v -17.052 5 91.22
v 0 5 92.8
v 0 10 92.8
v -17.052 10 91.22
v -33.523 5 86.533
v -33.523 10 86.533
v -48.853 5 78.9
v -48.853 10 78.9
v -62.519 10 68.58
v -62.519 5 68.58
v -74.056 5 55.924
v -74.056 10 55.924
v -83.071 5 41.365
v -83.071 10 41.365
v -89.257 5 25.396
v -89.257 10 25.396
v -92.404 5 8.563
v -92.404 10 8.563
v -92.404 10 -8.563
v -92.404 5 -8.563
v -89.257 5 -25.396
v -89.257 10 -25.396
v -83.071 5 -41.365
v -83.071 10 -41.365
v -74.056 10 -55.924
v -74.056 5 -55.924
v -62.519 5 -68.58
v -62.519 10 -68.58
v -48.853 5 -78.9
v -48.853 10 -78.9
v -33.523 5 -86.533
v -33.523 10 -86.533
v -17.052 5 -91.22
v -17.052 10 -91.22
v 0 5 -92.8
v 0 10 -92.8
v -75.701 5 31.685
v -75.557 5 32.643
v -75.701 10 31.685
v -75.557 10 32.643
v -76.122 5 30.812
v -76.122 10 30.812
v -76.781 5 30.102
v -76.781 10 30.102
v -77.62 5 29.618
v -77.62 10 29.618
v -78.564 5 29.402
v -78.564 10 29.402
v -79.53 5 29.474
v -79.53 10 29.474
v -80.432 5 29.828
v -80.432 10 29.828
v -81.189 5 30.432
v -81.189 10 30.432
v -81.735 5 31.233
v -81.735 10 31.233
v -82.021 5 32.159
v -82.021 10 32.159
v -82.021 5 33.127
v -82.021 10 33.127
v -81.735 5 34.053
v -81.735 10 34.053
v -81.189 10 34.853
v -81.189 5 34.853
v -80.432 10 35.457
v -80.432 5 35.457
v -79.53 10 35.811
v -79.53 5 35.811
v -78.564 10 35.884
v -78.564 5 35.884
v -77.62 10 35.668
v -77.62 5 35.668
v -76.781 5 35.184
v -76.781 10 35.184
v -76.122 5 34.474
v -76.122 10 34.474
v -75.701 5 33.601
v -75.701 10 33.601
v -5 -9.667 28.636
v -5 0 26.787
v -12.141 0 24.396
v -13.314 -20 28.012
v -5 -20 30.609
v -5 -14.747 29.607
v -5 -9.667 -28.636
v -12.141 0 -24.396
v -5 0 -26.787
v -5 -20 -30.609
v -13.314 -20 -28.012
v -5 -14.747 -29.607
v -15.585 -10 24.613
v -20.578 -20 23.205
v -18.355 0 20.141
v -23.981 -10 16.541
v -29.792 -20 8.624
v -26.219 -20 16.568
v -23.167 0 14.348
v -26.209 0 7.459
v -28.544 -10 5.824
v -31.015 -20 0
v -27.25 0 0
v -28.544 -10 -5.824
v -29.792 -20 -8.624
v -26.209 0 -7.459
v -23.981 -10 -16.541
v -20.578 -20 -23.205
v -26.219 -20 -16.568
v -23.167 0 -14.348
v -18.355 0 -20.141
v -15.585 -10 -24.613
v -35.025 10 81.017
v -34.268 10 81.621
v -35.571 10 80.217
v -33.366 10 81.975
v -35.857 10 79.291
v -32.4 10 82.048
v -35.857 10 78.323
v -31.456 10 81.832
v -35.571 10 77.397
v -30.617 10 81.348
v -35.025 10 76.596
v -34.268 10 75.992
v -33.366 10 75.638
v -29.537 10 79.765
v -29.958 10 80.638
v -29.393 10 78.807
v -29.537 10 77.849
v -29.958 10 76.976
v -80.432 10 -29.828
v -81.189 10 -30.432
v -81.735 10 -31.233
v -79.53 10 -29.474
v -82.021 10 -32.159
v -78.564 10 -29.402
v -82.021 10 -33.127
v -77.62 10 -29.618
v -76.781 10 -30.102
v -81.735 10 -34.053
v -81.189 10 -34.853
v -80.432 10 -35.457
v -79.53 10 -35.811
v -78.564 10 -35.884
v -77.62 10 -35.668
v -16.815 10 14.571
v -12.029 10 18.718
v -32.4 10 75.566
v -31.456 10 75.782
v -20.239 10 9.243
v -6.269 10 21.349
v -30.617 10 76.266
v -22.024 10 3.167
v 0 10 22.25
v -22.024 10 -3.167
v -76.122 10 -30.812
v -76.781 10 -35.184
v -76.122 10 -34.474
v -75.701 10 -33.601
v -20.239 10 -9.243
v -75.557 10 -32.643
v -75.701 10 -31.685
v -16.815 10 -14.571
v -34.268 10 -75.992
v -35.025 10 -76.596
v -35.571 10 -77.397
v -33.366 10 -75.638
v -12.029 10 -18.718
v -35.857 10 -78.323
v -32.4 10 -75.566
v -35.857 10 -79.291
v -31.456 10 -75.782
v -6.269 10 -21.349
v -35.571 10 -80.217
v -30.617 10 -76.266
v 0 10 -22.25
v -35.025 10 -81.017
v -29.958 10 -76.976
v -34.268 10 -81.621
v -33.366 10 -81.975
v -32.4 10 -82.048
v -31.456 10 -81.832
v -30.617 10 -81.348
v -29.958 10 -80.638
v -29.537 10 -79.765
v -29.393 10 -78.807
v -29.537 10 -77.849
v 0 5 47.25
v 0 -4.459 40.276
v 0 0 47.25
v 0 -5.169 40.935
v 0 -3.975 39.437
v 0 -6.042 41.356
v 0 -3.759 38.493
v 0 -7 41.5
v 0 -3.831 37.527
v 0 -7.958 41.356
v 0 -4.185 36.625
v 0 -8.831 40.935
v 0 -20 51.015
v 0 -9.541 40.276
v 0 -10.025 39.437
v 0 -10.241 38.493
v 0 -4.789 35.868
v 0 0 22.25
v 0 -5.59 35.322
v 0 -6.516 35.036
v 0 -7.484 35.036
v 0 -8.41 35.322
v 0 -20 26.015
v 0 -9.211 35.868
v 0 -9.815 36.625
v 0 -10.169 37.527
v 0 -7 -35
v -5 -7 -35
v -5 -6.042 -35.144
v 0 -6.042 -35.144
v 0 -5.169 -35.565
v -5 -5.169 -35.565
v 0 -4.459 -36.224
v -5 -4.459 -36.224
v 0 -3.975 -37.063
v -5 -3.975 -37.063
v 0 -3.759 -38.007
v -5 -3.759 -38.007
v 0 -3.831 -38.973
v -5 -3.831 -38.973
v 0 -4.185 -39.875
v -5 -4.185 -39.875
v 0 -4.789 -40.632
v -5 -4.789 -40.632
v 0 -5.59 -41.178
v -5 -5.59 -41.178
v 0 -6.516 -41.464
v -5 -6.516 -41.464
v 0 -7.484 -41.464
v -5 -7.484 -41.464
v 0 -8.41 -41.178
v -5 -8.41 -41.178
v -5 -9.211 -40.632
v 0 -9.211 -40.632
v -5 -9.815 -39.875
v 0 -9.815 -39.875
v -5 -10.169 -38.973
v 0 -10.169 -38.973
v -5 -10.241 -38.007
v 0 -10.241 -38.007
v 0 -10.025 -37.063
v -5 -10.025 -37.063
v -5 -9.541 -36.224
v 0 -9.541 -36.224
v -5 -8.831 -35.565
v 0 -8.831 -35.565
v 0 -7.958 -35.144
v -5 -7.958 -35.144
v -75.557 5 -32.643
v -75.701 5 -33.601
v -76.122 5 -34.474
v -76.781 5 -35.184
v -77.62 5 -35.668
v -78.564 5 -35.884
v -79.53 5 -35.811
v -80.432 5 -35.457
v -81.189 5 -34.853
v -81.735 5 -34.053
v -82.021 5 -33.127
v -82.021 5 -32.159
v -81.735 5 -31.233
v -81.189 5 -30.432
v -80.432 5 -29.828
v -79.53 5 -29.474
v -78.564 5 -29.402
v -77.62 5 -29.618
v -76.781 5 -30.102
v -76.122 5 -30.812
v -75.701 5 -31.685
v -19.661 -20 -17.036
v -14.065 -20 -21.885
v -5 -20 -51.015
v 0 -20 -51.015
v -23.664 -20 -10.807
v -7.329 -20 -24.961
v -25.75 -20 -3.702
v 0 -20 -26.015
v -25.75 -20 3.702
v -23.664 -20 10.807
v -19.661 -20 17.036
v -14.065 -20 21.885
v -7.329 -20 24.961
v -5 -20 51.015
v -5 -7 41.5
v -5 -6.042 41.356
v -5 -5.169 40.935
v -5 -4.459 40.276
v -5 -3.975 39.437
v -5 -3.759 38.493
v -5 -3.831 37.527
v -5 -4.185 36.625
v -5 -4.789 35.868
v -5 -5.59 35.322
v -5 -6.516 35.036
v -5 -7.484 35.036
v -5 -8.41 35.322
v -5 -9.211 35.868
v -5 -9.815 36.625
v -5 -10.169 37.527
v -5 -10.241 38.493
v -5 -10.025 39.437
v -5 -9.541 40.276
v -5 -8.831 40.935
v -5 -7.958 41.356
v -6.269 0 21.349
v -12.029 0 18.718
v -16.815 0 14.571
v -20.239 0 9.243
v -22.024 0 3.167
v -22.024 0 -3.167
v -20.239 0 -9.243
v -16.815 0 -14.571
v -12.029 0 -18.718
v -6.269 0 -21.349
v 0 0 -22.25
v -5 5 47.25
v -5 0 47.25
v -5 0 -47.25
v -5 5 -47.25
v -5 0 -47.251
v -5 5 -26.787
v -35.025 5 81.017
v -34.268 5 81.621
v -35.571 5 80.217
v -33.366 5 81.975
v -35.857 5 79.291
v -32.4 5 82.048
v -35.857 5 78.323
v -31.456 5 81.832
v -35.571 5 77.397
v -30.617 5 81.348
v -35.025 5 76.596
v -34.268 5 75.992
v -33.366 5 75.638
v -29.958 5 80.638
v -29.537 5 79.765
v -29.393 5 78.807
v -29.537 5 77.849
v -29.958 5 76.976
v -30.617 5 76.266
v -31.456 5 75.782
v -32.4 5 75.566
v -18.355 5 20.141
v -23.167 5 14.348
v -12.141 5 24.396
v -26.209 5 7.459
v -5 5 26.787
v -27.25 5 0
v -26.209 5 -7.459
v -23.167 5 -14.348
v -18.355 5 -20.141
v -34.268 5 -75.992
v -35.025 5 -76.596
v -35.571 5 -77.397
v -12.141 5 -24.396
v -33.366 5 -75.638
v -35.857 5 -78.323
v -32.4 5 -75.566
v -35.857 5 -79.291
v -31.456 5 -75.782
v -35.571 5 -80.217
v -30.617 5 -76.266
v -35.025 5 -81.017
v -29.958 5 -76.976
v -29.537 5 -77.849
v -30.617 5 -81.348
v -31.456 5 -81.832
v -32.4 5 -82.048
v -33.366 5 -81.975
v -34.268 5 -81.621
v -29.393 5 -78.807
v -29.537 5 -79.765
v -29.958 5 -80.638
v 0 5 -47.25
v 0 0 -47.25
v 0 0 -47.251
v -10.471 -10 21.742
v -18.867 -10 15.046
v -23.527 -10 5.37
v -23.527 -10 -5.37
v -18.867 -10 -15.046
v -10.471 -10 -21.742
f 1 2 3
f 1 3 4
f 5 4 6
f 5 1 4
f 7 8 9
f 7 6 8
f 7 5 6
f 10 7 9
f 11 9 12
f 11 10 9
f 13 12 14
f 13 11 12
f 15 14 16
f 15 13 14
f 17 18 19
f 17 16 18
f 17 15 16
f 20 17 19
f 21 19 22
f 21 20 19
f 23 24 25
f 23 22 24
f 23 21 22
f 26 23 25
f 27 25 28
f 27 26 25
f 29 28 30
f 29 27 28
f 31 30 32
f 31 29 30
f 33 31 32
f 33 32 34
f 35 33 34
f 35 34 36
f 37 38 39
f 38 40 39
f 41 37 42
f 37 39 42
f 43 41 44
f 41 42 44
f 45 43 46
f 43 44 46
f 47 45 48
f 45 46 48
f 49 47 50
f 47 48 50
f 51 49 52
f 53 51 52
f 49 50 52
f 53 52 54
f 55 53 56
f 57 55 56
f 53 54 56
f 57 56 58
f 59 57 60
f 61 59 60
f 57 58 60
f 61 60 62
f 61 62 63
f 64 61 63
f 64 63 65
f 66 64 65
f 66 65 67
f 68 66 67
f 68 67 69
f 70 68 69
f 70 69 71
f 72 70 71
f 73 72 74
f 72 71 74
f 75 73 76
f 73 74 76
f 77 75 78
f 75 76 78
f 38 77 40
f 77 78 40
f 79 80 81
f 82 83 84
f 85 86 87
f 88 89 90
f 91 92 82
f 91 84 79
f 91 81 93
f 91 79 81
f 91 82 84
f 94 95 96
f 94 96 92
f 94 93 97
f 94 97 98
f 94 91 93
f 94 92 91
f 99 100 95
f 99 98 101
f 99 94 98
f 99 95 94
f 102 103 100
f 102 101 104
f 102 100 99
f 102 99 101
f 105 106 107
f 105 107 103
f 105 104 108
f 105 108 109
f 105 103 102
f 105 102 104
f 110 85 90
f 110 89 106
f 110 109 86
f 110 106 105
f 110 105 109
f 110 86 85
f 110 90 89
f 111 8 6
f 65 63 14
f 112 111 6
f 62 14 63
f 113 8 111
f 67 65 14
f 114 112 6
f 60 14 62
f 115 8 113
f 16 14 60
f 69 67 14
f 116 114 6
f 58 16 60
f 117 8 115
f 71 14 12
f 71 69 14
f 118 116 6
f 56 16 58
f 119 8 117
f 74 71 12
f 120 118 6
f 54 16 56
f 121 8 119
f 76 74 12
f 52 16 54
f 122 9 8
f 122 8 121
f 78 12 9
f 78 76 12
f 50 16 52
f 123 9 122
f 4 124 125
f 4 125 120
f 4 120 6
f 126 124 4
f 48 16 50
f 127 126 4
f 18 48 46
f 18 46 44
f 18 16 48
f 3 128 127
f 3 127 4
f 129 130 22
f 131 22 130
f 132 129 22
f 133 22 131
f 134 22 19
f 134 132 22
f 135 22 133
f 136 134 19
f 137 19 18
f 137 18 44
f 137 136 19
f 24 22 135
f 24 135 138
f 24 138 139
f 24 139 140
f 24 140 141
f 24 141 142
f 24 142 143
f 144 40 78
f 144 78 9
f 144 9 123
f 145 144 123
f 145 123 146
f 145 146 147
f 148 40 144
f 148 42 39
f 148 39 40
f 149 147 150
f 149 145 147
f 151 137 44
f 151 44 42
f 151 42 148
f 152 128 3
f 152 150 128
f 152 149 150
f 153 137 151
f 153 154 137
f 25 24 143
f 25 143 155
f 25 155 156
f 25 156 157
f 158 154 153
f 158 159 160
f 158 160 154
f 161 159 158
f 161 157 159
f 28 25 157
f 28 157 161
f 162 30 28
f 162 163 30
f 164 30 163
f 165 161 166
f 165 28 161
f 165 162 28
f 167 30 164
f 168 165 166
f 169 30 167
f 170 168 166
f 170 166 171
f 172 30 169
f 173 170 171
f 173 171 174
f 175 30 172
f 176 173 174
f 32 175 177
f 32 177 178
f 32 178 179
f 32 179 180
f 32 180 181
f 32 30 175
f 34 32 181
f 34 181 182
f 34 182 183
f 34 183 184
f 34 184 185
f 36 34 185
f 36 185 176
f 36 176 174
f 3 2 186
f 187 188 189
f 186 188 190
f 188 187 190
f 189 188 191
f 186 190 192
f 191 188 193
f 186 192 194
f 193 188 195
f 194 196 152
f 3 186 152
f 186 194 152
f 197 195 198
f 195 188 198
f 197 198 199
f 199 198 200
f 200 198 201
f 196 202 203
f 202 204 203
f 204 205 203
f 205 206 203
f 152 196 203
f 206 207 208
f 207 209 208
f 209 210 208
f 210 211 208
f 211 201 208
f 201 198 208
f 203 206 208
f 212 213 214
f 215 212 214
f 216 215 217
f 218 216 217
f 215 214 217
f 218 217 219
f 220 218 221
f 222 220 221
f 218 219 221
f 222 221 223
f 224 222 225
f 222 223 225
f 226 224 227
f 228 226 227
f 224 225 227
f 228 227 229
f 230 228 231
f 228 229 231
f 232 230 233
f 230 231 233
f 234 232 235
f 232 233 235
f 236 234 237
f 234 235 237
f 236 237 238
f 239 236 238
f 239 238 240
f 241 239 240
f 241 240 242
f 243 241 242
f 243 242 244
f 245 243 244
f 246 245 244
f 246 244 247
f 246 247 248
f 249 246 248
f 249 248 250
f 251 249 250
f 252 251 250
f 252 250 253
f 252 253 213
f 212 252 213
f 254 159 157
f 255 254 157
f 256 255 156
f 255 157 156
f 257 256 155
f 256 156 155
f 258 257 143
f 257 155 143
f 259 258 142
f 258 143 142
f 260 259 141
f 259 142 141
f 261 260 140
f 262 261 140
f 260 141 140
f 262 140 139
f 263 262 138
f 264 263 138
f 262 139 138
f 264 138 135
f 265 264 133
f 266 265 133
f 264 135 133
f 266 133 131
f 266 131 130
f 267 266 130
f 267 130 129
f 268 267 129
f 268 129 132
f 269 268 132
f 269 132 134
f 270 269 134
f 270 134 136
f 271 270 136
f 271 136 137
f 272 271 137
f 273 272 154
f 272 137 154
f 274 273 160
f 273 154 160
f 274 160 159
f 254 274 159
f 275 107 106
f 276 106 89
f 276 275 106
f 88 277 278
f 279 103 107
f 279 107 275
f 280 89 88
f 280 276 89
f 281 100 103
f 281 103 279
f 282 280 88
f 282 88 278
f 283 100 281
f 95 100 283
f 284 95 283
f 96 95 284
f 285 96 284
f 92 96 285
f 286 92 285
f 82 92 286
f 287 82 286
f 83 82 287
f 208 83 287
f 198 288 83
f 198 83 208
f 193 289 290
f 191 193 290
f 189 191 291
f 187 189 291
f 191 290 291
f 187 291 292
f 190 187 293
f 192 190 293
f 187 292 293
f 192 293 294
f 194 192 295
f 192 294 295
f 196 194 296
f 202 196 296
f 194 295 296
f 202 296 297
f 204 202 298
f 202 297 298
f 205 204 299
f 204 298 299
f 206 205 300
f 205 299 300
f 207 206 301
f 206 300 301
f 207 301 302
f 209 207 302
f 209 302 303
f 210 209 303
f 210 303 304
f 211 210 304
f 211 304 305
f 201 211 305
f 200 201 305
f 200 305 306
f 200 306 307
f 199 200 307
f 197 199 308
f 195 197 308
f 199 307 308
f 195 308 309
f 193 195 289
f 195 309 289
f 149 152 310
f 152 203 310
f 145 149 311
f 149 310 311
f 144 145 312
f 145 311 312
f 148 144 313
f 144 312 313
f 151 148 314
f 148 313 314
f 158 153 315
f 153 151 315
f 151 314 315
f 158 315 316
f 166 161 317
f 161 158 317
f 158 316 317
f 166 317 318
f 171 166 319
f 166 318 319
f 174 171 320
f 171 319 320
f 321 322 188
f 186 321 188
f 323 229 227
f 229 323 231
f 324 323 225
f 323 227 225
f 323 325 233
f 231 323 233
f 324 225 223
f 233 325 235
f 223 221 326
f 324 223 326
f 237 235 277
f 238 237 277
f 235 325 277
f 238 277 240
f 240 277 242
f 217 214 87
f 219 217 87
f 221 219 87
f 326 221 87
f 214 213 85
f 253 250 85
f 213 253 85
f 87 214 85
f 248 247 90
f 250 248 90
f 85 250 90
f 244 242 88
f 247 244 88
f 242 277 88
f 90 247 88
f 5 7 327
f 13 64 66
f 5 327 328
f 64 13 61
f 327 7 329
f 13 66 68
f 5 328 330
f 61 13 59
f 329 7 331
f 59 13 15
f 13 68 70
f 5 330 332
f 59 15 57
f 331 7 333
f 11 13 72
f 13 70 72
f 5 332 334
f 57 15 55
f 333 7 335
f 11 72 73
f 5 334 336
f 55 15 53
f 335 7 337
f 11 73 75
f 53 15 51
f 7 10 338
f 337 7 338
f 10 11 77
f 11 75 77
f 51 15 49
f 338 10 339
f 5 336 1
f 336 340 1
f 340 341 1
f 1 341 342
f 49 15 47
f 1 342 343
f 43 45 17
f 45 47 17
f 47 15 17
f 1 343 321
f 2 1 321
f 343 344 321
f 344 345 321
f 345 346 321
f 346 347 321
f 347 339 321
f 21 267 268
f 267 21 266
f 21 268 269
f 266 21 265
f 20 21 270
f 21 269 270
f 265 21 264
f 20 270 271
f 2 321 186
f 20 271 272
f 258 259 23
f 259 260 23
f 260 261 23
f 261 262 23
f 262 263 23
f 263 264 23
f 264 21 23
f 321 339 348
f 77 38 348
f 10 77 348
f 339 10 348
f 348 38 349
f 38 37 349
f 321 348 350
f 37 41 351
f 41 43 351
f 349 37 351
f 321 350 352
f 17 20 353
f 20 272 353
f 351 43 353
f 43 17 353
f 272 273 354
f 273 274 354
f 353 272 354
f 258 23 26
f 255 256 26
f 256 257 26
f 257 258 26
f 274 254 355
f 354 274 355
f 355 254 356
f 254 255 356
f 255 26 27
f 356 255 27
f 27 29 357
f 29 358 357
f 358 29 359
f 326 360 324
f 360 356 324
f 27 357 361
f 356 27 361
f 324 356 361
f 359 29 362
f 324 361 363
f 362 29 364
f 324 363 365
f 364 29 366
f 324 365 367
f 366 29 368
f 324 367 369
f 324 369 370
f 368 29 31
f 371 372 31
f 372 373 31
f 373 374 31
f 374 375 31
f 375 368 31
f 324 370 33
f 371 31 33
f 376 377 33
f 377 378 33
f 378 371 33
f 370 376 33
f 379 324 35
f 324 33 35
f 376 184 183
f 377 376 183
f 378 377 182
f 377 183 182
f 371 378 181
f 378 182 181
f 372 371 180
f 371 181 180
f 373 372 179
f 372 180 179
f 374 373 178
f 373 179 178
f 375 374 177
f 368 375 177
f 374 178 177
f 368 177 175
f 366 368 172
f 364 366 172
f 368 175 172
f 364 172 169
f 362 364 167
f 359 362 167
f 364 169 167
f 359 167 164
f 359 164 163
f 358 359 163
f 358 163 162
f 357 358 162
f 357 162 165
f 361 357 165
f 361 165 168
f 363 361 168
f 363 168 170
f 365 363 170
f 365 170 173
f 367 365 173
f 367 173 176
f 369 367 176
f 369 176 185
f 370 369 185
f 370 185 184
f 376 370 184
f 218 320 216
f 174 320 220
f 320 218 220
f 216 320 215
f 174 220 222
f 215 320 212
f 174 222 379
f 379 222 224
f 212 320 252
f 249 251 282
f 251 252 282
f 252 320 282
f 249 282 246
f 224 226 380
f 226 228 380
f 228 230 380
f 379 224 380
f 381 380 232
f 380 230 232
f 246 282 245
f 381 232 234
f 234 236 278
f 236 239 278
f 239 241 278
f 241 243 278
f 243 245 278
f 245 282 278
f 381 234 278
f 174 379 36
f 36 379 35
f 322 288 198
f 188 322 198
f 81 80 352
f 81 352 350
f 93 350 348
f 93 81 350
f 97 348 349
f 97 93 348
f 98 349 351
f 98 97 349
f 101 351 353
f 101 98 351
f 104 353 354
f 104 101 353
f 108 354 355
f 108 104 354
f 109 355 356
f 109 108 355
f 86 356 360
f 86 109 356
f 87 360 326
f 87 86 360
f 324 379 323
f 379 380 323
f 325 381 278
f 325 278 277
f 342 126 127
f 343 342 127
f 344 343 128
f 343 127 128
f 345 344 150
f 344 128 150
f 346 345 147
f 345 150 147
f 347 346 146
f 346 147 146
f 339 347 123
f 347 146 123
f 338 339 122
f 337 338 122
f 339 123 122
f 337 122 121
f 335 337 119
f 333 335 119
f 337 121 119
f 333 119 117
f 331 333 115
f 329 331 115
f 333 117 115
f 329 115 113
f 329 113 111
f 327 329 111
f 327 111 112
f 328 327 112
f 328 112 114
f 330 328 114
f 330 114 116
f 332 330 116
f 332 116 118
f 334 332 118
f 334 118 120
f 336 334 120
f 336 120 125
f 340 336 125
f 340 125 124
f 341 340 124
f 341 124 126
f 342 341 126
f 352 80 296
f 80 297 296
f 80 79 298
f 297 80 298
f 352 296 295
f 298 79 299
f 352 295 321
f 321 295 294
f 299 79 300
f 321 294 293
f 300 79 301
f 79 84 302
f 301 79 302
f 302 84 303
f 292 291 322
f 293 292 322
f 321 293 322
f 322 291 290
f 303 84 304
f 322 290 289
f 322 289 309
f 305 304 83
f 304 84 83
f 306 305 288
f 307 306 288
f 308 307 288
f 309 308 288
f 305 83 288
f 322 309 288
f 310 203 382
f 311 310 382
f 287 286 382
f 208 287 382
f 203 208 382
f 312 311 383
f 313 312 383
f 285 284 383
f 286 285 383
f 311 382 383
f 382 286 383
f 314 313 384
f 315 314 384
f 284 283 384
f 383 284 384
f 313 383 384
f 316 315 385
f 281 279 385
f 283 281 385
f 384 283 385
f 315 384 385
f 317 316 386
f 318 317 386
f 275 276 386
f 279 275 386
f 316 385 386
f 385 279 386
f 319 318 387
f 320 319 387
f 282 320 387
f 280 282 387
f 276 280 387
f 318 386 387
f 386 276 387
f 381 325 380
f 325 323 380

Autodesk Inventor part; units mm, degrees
ref_plane "YZ Plane" through (0, 0, 0) normal (1, 0, 0) x (0, 1, 0)
ref_plane "XZ Plane" through (0, 0, 0) normal (0, 1, 0) x (-1, 0, 0)
ref_plane "XY Plane" through (0, 0, 0) normal (0, 0, 1) x (1, 0, 0)
sketch "Skizze1" plane through (0, 0, 0) normal (0, 1, 0) x (-1, 0, 0)
  circle A0 centre (0, 0) radius 22.25
  circle A1 centre (0, 0) radius 27.25
  line L0 (5, 47.25) -> (-5, 47.25)
  line L1 (-5, 47.25) -> (-5, -47.25)
  line L2 (-5, -47.25) -> (5, -47.25)
  line L3 (5, -47.25) -> (5, 47.25)
  line L4 (5, 47.25) -> (-5, -47.25) construction
  line L5 (-5, 47.25) -> (5, -47.25) construction
  line L6 (0, 47.25) -> (0, -47.25)
  point P0 (0, 22.25)
  point P1 (0, -22.25)
  point P2 (5, -26.7874)
  point P3 (5, 26.7874)
  dimension "d0" = 44.5
  dimension "d1" = 54.5
  dimension "d2" = 10
  dimension "d3" = 94.5
extrude "Extrusion1" add sketch "Skizze1" along normal blind 5 contours A0 L3 A1 | A0 L6 A1 L3 | L3 A1 L6 A0 | A1 L6 L0 L3 | L3 L2 L6 A1
sketch "Skizze4" plane through (0, 5, 0) normal (0, 1, 0) x (1, 0, 0)
  circle A0 centre (0, 0) radius 22.25
  circle A1 centre (0, 0) radius 92.8
  circle A2 centre (0, 0) radius 72.8
  line L0 (0, -92.8) -> (0, 92.8)
  point P0 (0, 22.25)
  point P1 (0, -22.25)
  dimension "d23" = 185.6
  dimension "d24" = 145.6
  dimension "d43" = 44.5
extrude "Extrusion4" add sketch "Skizze4" along normal blind 5 contours A0 L0 A2 | A2 L0 A1 picked at (-55.7302, 0.894) picked at (-74.476, -42.8466)
sketch "Skizze5" plane through (0, 10, 0) normal (0, 1, 0) x (1, 0, 0)
  circle A0 centre (0, 0) radius 52.8
  arc A1 (0, 92.8) -> (0, -92.8) centre (0, 0) ccw projected
  line L0 (0, 0) -> (72.8, 0) construction
  line L1 (0, 0) -> (72.8, 0) construction
  circle A2 centre (0, 0) radius 85.3
  line L2 (0, 0) -> (-35.513, 85.736)
  line L3 (0, 0) -> (92.8, 0) construction
  line L4 (0, 0) -> (-85.736, 35.513)
  line L5 (0, 0) -> (92.8, 0) construction
  line L6 (0, 0) -> (-35.513, -85.736)
  line L7 (0, 0) -> (92.8, 0) construction
  line L8 (0, 0) -> (-85.736, -35.513)
  line L9 (0, 0) -> (92.8, 0) construction
  circle A3 centre (-32.6429, -78.8069) radius 3.25
  circle A4 centre (-78.8069, -32.6429) radius 3.25
  circle A5 centre (-78.8069, 32.6429) radius 3.25
  circle A6 centre (-32.6429, 78.8069) radius 3.25
  circle A7 centre (0, 0) radius 77.8
  dimension "d27" = 105.6
  dimension "d31" = 170.6
  dimension "d32" = 112.5
  dimension "d33" = 157.5
  dimension "d34" = 112.5
  dimension "d35" = 157.5
  dimension "d36" = 6.5
  dimension "d37" = 6.5
  dimension "d38" = 6.5
  dimension "d39" = 6.5
  dimension "d42" = 155.6
extrude "Extrusion5" cut sketch "Skizze5" against normal through all contours A6 A2 L2 | L2 A2 A6 | A3 A2 L6 | L6 A2 A3 | A5 A2 L4 | L4 A2 A5 | L2 A6 A2 | A2 A6 L2 | A4 A2 L8 | L8 A2 A4 | L6 A3 A2 | A2 A3 L6 | L4 A5 A2 | A2 A5 L4 | L8 A4 A2 | A2 A4 L8
sketch "Skizze6" plane through (0, 0, 0) normal (0, -1, 0) x (1, 0, 0)
  circle A0 centre (0, 0) radius 38.25
  line L0 (5, 63.25) -> (-5, 63.25)
  line L1 (-5, 63.25) -> (-5, -63.25)
  line L2 (-5, -63.25) -> (5, -63.25)
  line L3 (5, -63.25) -> (5, 63.25)
  line L4 (5, 63.25) -> (-5, -63.25) construction
  line L5 (-5, 63.25) -> (5, -63.25) construction
  circle A1 centre (0, 0) radius 43.25
  circle A2 centre (0, 0) radius 22.25
  line L6 (0, -47.25) -> (0, -92.8) projected
  line L7 (0, -63.25) -> (0, 63.25)
  point P0 (-5, 42.96)
  point P1 (-5, -42.96)
  point P2 (0, -22.25)
  point P3 (0, 22.25)
  dimension "d44" = 76.5
  dimension "d45" = 10
  dimension "d46" = 126.5
  dimension "d47" = 86.5
extrude "Extrusion6" add sketch "Skizze6" along normal blind 85 contours L7 A2 L1 A0 | A0 L1 A1 L7 | L7 A1 L1 A0 | A0 L1 A2 L7 | L1 A2 A0 | A0 L1 A1 | A1 L1 L0 L7 | L7 L6 L2 L1 A1
chamfer "Fasen1" distance 16 distance2 85 1 edges at (-22.25, -85, 0) measured on face at (-1.6667, -85, -42.82)
chamfer "Fasen2" distance 85 angle 10.66 1 edges at (-2.5, 0, -63.25) measured on face at (-3.3333, -28.3333, -63.25)
chamfer "Fasen3" distance 85 distance2 16 1 edges at (-2.5, 0, 63.25) measured on face at (-1.6667, -28.3333, 63.25)
chamfer "Fasen4" distance 85 distance2 16 1 edges at (-43.25, 0, 0) measured on face at (-38.2627, -56.6667, -20.1626)
sketch "Skizze7" plane through (0, -85, 0) normal (0, -1, 0) x (1, 0, 0)
  circle A0 centre (0, 0) radius 65
  dimension "d62" = 130
extrude "Extrusion7" cut sketch "Skizze7" against normal blind 65
sketch "Skizze8" plane through (-5, 5, -47.25) normal (-1, 0, 0) x (0, 0, 1)
  circle A0 centre (9, -12) radius 3.25
  line L0 (-3.7651, -25) -> (16.641, -25) projected
  line L1 (0, -5) -> (0, 0) projected
  point P0 (47.25, -5)
  dimension "d65" = 6.5
  dimension "d66" = 13
  dimension "d67" = 9
sketch "Skizze9" plane through (-5, 5, 26.7874) normal (-1, 0, 0) x (0, 0, 1)
  circle A0 centre (11.4626, -12) radius 3.25
  line L0 (3.8217, -25) -> (24.2273, -25) projected
  line L1 (20.4626, -5) -> (20.4626, 0) projected
  point P0 (-26.7874, -5)
  dimension "d68" = 6.5
  dimension "d69" = 13
  dimension "d70" = 9
extrude "Extrusion8" cut sketch "Skizze8" against normal through all
extrude "Extrusion9" cut sketch "Skizze9" against normal through all
properties part number "rohr-mount-v2"
